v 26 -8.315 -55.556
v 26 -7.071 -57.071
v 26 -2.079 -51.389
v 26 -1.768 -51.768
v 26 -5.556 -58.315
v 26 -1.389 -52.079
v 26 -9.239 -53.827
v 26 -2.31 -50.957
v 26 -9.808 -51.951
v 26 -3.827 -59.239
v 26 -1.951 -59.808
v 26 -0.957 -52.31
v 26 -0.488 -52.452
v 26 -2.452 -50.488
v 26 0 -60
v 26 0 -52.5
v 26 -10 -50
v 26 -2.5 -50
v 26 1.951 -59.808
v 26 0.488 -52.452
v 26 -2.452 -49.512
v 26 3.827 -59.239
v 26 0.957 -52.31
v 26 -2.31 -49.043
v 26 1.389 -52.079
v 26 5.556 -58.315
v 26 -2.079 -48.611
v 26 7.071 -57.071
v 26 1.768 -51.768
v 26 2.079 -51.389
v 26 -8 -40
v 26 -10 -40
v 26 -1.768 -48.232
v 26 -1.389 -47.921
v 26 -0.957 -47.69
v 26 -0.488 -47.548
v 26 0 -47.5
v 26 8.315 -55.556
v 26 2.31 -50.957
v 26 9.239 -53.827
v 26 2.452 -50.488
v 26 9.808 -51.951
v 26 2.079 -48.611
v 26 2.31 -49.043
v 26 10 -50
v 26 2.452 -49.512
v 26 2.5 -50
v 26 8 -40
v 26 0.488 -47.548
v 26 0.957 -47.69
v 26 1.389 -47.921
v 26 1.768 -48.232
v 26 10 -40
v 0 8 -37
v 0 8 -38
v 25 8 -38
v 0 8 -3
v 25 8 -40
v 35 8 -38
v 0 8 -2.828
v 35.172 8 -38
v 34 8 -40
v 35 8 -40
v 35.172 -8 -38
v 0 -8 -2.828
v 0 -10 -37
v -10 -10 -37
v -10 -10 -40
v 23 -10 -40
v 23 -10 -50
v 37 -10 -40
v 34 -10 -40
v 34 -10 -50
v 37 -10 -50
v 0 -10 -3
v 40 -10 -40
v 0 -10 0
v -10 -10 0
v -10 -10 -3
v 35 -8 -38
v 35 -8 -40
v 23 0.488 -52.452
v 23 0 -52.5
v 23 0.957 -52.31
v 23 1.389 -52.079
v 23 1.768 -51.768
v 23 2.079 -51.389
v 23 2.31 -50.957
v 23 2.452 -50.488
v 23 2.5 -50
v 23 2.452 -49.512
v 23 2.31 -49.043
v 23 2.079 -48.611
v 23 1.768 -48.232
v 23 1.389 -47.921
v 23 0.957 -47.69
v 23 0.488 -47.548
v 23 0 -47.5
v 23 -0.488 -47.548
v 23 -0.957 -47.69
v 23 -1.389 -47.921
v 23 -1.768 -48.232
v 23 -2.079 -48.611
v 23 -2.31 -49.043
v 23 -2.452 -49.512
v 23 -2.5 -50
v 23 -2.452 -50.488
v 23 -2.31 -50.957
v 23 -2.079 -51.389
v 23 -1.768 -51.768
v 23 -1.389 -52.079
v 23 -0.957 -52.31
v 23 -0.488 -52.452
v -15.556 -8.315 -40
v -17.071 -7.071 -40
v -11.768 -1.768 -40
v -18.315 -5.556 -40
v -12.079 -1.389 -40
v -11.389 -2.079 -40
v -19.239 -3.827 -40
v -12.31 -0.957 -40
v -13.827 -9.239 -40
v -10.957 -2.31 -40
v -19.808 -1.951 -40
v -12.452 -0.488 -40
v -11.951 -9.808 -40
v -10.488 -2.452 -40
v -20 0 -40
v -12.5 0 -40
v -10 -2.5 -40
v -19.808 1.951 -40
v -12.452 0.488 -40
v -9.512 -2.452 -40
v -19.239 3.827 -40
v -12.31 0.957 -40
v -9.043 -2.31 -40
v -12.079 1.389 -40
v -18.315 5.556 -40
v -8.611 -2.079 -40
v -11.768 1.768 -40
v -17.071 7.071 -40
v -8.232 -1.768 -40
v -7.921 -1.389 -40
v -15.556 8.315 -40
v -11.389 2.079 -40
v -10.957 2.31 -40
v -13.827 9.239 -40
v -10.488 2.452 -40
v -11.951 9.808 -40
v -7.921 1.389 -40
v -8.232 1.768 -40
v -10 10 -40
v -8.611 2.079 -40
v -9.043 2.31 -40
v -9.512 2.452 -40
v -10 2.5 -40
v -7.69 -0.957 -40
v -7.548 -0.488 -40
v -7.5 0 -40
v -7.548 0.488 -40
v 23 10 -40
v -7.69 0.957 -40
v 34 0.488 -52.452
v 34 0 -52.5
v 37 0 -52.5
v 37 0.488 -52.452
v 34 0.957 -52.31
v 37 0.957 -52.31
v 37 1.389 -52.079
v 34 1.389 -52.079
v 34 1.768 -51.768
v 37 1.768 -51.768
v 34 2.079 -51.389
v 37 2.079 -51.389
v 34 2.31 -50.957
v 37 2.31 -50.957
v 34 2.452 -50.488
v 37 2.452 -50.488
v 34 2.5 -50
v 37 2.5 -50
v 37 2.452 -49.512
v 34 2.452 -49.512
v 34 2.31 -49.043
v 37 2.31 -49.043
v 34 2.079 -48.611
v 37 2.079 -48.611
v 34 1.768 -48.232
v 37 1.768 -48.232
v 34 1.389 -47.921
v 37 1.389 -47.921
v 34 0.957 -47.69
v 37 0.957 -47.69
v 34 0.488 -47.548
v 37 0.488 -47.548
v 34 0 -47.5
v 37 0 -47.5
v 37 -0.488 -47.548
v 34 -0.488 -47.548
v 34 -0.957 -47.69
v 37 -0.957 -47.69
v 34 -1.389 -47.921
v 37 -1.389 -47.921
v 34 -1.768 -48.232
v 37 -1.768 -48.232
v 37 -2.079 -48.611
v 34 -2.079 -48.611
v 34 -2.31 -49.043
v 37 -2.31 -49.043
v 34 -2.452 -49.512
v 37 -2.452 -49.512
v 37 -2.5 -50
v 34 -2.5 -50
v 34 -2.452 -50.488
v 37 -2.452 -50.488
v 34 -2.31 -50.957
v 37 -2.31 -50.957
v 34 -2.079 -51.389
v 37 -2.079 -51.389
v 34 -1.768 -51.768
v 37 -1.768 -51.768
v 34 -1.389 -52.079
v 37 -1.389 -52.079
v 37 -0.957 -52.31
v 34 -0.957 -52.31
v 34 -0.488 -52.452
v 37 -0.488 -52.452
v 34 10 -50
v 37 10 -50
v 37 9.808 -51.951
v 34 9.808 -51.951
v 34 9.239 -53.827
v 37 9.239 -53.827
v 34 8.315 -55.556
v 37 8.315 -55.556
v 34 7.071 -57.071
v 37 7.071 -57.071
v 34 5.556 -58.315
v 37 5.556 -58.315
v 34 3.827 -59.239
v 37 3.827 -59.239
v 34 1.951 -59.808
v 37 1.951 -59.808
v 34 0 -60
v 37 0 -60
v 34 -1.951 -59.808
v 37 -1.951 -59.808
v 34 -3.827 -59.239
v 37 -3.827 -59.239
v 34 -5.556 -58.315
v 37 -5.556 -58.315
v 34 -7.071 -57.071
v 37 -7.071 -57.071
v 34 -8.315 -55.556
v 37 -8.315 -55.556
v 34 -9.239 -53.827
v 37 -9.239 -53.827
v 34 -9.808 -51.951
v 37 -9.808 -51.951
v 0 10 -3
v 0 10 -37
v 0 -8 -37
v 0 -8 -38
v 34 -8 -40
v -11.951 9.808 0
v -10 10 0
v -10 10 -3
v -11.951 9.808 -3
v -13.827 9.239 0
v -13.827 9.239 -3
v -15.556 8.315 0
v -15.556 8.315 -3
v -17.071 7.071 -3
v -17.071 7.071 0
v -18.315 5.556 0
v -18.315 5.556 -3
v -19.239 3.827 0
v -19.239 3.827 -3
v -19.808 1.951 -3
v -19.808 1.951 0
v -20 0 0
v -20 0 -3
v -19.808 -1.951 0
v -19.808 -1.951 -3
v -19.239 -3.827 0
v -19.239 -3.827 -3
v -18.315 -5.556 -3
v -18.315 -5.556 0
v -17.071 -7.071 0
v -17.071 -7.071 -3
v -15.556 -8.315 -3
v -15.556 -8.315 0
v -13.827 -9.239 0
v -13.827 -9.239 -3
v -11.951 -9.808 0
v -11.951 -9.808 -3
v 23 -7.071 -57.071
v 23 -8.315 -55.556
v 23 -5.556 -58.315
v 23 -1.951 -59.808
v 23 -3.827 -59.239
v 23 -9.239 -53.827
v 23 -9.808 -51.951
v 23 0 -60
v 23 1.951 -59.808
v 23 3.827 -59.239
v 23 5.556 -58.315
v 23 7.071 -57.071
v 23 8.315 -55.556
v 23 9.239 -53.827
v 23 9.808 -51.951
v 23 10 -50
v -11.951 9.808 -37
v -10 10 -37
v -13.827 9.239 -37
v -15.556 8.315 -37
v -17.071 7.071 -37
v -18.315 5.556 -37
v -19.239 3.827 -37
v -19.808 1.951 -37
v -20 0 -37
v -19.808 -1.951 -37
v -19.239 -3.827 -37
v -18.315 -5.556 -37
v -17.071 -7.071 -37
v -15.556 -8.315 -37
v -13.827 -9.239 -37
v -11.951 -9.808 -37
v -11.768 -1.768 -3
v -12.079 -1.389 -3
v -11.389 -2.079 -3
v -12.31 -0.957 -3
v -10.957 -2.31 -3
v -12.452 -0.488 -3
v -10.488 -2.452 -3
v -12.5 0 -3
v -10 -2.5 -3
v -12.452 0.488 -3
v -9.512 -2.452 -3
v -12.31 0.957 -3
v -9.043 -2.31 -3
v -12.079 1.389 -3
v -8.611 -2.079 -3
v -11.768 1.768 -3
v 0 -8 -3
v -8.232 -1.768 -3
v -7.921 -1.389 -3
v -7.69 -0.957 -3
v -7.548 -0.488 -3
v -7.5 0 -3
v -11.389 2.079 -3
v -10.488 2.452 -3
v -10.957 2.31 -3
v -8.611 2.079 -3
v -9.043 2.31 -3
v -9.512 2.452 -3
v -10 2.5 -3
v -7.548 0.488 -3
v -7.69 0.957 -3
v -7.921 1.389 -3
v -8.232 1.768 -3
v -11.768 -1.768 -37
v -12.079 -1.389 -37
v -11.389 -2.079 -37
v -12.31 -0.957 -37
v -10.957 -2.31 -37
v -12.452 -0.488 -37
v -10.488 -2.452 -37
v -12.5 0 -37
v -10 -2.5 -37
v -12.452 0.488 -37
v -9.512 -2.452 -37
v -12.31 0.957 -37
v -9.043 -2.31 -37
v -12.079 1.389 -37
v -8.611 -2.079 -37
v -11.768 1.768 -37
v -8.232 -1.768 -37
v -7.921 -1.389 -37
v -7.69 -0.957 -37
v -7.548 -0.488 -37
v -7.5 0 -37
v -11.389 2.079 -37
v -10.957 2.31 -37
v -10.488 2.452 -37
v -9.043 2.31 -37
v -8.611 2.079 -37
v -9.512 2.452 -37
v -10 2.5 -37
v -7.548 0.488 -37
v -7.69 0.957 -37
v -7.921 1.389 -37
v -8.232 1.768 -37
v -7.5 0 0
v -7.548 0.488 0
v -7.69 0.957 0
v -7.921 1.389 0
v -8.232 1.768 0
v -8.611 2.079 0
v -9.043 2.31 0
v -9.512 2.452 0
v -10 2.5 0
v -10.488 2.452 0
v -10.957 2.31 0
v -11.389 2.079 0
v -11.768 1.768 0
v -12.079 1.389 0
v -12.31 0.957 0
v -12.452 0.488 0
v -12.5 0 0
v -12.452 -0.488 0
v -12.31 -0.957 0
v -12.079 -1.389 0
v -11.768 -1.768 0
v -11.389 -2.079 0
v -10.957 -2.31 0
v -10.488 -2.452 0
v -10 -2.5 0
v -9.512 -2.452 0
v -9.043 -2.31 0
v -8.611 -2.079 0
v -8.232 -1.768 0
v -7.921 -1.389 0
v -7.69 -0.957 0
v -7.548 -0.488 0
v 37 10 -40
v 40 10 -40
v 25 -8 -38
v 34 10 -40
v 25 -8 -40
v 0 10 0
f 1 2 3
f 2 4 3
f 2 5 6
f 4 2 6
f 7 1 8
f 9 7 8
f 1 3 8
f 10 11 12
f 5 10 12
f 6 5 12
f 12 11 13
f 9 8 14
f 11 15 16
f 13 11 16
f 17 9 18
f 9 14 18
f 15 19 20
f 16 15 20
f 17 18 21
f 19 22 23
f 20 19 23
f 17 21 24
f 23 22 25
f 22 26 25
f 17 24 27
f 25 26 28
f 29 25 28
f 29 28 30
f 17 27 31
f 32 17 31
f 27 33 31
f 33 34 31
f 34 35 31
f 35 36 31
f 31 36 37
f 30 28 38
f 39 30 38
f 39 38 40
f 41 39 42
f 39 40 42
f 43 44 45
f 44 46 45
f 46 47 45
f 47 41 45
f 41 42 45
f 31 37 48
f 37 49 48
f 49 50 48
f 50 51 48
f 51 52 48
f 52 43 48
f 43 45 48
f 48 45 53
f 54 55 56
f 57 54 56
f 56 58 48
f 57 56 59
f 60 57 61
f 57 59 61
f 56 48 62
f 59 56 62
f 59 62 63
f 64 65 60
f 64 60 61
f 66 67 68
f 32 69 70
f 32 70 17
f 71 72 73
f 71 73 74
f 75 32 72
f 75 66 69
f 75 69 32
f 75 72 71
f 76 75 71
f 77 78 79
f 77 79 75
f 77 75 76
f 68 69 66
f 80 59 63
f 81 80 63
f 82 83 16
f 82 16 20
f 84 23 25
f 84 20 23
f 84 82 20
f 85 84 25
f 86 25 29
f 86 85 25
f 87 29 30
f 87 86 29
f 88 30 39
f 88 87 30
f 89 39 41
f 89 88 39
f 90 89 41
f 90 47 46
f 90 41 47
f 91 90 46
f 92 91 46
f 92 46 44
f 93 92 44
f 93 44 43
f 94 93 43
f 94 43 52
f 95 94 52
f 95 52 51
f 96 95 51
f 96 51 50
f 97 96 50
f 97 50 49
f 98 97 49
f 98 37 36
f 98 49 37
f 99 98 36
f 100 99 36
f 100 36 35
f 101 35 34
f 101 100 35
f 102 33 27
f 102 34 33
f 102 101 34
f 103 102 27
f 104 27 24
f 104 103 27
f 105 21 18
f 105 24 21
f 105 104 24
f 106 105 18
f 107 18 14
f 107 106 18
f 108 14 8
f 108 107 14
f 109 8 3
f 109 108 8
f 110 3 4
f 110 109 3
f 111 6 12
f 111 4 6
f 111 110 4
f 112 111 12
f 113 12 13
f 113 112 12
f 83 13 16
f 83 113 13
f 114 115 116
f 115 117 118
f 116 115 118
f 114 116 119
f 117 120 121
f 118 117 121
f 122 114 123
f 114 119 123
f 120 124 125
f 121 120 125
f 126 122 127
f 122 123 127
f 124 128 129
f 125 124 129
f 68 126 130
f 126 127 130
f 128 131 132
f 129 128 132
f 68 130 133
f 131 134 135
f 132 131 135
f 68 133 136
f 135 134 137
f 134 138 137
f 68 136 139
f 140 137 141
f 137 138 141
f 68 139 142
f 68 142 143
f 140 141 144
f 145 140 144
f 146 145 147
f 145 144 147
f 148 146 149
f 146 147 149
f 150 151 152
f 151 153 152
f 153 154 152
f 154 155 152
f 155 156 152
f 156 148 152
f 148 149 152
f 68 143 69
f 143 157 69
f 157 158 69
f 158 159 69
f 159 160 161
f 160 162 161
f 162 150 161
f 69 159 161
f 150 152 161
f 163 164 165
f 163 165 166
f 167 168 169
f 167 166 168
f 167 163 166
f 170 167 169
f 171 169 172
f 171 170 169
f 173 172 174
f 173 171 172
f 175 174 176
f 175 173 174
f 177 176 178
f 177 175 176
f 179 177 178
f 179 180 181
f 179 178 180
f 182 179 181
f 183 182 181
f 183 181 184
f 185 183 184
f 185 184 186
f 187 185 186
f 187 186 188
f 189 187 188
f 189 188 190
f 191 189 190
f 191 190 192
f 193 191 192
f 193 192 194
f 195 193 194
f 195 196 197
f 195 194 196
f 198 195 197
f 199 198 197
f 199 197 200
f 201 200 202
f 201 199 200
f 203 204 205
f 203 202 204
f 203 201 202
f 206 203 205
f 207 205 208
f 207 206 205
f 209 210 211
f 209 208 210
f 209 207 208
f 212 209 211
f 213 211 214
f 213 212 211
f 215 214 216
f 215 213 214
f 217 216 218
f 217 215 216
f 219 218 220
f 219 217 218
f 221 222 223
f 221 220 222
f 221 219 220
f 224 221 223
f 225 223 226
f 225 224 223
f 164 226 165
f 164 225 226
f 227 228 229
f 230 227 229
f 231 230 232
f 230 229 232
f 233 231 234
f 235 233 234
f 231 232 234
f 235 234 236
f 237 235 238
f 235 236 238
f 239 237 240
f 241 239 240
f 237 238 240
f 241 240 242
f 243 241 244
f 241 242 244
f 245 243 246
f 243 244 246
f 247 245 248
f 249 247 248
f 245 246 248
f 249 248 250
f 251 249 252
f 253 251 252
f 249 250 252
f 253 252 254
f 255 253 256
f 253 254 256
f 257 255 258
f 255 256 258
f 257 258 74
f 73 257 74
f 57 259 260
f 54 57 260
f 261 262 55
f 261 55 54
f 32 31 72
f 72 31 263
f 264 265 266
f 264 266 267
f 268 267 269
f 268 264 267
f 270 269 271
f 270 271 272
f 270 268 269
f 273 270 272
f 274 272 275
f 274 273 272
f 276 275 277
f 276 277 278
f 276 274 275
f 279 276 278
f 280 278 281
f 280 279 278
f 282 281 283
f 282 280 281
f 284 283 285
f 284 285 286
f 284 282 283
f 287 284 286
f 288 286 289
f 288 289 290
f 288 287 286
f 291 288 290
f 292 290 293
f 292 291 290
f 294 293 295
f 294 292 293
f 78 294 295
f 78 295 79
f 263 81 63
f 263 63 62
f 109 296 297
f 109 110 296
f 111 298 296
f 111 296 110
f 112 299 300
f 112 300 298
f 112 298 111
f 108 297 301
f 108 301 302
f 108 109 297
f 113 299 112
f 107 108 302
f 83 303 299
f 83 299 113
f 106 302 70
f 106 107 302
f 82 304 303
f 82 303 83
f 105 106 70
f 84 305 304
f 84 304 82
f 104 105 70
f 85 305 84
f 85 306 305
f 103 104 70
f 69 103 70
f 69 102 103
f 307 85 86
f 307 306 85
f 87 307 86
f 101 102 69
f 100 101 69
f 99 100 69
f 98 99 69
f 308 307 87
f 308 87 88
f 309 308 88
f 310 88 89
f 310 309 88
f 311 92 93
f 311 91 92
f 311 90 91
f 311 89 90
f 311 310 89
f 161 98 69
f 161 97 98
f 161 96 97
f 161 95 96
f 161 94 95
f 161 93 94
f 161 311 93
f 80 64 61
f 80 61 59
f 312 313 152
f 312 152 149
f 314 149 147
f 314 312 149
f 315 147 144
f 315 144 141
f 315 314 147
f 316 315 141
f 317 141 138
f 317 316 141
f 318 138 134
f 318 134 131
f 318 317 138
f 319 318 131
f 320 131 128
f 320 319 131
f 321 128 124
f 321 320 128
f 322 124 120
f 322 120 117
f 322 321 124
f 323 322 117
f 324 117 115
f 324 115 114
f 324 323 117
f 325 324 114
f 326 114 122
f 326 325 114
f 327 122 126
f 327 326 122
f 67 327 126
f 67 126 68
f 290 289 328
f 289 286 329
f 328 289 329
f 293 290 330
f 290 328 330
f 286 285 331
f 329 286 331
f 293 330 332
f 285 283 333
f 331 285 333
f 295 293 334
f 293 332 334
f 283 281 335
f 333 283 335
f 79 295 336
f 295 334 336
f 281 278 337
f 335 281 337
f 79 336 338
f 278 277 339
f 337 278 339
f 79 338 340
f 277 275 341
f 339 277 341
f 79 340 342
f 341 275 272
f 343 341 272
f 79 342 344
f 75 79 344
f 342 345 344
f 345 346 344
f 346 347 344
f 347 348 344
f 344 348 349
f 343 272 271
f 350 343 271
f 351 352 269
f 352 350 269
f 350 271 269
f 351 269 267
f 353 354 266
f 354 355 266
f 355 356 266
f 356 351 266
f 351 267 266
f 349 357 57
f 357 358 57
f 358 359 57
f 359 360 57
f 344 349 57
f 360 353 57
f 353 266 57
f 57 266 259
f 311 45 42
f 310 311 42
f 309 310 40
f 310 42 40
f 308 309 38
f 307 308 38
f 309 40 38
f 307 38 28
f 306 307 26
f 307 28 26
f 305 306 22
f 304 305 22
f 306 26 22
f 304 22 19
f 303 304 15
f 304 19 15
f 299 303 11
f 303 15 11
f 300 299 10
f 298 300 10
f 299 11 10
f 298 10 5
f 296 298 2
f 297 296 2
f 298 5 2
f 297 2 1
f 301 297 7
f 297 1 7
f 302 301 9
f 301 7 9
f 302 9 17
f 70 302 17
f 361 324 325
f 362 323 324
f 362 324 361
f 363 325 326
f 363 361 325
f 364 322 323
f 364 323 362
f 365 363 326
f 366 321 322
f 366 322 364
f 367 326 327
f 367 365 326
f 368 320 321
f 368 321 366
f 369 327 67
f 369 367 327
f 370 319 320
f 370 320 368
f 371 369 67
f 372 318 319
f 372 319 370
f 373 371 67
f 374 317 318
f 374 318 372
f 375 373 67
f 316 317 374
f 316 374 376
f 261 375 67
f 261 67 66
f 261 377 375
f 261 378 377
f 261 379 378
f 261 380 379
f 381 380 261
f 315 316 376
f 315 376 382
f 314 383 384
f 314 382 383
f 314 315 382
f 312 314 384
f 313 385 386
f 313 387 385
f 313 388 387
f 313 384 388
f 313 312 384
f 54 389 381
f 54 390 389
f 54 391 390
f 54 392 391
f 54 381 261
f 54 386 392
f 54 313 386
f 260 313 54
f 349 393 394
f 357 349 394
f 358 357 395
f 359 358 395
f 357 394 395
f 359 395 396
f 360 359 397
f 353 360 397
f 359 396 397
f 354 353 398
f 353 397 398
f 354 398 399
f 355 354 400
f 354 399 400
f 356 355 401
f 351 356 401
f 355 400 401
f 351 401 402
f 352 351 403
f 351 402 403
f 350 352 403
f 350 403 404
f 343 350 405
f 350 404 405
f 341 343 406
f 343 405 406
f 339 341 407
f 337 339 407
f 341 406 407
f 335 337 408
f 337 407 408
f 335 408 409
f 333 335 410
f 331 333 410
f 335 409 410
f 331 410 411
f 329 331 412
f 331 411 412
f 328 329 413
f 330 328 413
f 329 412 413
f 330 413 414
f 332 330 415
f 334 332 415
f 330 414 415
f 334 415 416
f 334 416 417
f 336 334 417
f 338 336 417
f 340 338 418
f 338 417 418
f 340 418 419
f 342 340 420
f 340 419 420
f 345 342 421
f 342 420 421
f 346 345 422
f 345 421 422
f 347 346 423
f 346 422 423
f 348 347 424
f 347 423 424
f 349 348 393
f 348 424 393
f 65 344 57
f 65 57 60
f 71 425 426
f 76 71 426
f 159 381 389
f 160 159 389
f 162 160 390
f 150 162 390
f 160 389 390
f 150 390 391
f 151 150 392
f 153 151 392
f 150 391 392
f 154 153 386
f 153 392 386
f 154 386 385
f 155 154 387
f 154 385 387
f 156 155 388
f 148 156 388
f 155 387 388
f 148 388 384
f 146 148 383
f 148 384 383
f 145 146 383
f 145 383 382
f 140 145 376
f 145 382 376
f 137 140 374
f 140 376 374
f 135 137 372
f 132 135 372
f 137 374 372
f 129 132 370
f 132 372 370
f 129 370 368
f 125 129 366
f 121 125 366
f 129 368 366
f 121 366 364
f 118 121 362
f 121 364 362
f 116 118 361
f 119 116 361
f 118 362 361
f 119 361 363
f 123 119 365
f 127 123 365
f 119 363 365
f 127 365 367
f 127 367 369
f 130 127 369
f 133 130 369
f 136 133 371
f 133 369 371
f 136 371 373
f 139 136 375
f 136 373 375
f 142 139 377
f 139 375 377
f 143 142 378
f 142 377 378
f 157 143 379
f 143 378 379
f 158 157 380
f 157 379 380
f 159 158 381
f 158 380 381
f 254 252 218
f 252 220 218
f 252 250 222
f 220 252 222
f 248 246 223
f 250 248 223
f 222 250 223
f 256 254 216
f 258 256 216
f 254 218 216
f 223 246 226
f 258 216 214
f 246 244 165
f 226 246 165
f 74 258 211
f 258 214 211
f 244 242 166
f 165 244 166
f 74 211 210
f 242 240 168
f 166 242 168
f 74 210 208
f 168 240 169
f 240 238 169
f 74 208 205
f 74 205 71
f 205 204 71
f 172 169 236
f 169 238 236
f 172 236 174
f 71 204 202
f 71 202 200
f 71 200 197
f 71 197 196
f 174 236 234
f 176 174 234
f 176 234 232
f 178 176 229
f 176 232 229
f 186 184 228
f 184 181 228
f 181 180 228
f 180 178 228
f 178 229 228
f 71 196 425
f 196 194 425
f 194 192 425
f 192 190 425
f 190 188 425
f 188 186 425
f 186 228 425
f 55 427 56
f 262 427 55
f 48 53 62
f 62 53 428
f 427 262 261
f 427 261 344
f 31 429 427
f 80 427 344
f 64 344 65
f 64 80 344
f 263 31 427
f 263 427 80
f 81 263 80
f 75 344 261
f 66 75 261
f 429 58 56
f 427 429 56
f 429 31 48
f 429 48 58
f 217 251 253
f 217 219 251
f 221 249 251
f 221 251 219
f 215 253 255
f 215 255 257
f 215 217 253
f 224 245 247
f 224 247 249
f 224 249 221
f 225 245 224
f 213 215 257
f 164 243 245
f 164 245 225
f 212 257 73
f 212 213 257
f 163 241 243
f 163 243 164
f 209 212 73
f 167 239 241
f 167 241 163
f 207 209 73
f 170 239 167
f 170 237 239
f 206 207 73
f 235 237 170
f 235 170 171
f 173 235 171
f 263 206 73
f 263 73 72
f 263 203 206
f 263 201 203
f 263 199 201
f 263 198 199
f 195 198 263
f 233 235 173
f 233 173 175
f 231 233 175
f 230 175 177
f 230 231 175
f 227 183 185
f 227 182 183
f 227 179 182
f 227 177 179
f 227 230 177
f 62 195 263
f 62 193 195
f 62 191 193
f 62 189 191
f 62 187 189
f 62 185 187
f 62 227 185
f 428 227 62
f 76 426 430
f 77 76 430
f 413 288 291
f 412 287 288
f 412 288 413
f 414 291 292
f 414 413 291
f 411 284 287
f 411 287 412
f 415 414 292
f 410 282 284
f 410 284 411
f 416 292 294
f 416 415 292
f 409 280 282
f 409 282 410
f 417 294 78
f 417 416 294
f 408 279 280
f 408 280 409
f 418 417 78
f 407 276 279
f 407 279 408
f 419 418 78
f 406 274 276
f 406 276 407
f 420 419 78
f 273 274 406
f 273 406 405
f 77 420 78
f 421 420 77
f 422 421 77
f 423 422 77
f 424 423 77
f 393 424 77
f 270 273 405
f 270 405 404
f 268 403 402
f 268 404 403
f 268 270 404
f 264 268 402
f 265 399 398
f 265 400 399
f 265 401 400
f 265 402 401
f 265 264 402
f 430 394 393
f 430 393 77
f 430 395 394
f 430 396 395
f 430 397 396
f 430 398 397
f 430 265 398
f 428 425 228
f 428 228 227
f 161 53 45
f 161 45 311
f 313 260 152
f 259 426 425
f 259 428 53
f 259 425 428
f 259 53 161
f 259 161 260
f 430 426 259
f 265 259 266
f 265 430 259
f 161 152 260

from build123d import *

# Parameters (mm, degrees)
BOSS_EXTRUDE1_DEPTH = 10
BOSS_EXTRUDE2_START = 37
BOSS_EXTRUDE2_DEPTH = 3
LPATTERN1_COUNT     = 2
LPATTERN1_PITCH     = 11
SKETCH3_R           = 2.5
CUT_EXTRUDE1_DEPTH  = 40
SKETCH4_R           = 2.5
BOSS_EXTRUDE3_DEPTH = 3
LPATTERN2_COUNT     = 2
LPATTERN2_PITCH     = 37
SHELL2_START        = -8
SHELL2_DEPTH        = 16


# Read off the part's stored shape, not the designer's step: Shell2
with BuildPart() as part:
    # Sketch1 → Boss-Extrude1 (new, symmetric)
    with BuildSketch(Plane(origin=(0, 0, 0), x_dir=(1, 0, 0), z_dir=(0, 1, 0))):
        Polygon((0, 0), (0, 40), (40, 40), align=None)
    extrude(amount=BOSS_EXTRUDE1_DEPTH, both=True)

    # Sketch2 → Boss-Extrude2 (add)
    with BuildSketch(Plane(origin=(0, 0, 0), x_dir=(0, 0, -1), z_dir=(1, 0, 0)).offset(BOSS_EXTRUDE2_START)):
        with BuildLine():
            Line((40, 10), (50, 10))
            ThreePointArc((50, 10), (60, 0), (50, -10))
            Line((50, -10), (40, -10))
            Line((40, -10), (40, 10))
        make_face()
    boss_extrude2 = extrude(amount=-BOSS_EXTRUDE2_DEPTH)

    # LPattern1: Boss-Extrude2 ×2
    with Locations(*[(-i * LPATTERN1_PITCH, 0, 0) for i in range(1, LPATTERN1_COUNT)]):
        add(boss_extrude2)

    # Sketch3 → Cut-Extrude1 (cut)
    with BuildSketch(Plane(origin=(0, 0, 0), x_dir=(0, 0, -1), z_dir=(1, 0, 0))):
        with Locations((50, 0)):
            Circle(SKETCH3_R)
    extrude(amount=CUT_EXTRUDE1_DEPTH, mode=Mode.SUBTRACT)

    # Sketch4 → Boss-Extrude3 (add)
    with BuildSketch(Plane.XY):
        with BuildLine():
            Line((0, 10), (-10, 10))
            ThreePointArc((-10, 10), (-20, 0), (-10, -10))
            Line((-10, -10), (0, -10))
            Line((0, -10), (0, 10))
        make_face()
        with Locations((-10, 0)):
            Circle(SKETCH4_R, mode=Mode.SUBTRACT)
    boss_extrude3 = extrude(amount=-BOSS_EXTRUDE3_DEPTH)

    # LPattern2: Boss-Extrude3 ×2
    with Locations(*[(0, 0, -i * LPATTERN2_PITCH) for i in range(1, LPATTERN2_COUNT)]):
        add(boss_extrude3)

    # Shell2 outline → Shell2 (cut)
    with BuildSketch(Plane(origin=(0, 0, 0), x_dir=(1, 0, 0), z_dir=(0, 1, 0)).offset(SHELL2_START)):
        Polygon((35, 40), (25, 40), (25, 38), (0, 38), (0, 2.828427125), (35.171572875, 38), (35, 38), align=None)
    extrude(amount=SHELL2_DEPTH, mode=Mode.SUBTRACT)


solid = part.part
